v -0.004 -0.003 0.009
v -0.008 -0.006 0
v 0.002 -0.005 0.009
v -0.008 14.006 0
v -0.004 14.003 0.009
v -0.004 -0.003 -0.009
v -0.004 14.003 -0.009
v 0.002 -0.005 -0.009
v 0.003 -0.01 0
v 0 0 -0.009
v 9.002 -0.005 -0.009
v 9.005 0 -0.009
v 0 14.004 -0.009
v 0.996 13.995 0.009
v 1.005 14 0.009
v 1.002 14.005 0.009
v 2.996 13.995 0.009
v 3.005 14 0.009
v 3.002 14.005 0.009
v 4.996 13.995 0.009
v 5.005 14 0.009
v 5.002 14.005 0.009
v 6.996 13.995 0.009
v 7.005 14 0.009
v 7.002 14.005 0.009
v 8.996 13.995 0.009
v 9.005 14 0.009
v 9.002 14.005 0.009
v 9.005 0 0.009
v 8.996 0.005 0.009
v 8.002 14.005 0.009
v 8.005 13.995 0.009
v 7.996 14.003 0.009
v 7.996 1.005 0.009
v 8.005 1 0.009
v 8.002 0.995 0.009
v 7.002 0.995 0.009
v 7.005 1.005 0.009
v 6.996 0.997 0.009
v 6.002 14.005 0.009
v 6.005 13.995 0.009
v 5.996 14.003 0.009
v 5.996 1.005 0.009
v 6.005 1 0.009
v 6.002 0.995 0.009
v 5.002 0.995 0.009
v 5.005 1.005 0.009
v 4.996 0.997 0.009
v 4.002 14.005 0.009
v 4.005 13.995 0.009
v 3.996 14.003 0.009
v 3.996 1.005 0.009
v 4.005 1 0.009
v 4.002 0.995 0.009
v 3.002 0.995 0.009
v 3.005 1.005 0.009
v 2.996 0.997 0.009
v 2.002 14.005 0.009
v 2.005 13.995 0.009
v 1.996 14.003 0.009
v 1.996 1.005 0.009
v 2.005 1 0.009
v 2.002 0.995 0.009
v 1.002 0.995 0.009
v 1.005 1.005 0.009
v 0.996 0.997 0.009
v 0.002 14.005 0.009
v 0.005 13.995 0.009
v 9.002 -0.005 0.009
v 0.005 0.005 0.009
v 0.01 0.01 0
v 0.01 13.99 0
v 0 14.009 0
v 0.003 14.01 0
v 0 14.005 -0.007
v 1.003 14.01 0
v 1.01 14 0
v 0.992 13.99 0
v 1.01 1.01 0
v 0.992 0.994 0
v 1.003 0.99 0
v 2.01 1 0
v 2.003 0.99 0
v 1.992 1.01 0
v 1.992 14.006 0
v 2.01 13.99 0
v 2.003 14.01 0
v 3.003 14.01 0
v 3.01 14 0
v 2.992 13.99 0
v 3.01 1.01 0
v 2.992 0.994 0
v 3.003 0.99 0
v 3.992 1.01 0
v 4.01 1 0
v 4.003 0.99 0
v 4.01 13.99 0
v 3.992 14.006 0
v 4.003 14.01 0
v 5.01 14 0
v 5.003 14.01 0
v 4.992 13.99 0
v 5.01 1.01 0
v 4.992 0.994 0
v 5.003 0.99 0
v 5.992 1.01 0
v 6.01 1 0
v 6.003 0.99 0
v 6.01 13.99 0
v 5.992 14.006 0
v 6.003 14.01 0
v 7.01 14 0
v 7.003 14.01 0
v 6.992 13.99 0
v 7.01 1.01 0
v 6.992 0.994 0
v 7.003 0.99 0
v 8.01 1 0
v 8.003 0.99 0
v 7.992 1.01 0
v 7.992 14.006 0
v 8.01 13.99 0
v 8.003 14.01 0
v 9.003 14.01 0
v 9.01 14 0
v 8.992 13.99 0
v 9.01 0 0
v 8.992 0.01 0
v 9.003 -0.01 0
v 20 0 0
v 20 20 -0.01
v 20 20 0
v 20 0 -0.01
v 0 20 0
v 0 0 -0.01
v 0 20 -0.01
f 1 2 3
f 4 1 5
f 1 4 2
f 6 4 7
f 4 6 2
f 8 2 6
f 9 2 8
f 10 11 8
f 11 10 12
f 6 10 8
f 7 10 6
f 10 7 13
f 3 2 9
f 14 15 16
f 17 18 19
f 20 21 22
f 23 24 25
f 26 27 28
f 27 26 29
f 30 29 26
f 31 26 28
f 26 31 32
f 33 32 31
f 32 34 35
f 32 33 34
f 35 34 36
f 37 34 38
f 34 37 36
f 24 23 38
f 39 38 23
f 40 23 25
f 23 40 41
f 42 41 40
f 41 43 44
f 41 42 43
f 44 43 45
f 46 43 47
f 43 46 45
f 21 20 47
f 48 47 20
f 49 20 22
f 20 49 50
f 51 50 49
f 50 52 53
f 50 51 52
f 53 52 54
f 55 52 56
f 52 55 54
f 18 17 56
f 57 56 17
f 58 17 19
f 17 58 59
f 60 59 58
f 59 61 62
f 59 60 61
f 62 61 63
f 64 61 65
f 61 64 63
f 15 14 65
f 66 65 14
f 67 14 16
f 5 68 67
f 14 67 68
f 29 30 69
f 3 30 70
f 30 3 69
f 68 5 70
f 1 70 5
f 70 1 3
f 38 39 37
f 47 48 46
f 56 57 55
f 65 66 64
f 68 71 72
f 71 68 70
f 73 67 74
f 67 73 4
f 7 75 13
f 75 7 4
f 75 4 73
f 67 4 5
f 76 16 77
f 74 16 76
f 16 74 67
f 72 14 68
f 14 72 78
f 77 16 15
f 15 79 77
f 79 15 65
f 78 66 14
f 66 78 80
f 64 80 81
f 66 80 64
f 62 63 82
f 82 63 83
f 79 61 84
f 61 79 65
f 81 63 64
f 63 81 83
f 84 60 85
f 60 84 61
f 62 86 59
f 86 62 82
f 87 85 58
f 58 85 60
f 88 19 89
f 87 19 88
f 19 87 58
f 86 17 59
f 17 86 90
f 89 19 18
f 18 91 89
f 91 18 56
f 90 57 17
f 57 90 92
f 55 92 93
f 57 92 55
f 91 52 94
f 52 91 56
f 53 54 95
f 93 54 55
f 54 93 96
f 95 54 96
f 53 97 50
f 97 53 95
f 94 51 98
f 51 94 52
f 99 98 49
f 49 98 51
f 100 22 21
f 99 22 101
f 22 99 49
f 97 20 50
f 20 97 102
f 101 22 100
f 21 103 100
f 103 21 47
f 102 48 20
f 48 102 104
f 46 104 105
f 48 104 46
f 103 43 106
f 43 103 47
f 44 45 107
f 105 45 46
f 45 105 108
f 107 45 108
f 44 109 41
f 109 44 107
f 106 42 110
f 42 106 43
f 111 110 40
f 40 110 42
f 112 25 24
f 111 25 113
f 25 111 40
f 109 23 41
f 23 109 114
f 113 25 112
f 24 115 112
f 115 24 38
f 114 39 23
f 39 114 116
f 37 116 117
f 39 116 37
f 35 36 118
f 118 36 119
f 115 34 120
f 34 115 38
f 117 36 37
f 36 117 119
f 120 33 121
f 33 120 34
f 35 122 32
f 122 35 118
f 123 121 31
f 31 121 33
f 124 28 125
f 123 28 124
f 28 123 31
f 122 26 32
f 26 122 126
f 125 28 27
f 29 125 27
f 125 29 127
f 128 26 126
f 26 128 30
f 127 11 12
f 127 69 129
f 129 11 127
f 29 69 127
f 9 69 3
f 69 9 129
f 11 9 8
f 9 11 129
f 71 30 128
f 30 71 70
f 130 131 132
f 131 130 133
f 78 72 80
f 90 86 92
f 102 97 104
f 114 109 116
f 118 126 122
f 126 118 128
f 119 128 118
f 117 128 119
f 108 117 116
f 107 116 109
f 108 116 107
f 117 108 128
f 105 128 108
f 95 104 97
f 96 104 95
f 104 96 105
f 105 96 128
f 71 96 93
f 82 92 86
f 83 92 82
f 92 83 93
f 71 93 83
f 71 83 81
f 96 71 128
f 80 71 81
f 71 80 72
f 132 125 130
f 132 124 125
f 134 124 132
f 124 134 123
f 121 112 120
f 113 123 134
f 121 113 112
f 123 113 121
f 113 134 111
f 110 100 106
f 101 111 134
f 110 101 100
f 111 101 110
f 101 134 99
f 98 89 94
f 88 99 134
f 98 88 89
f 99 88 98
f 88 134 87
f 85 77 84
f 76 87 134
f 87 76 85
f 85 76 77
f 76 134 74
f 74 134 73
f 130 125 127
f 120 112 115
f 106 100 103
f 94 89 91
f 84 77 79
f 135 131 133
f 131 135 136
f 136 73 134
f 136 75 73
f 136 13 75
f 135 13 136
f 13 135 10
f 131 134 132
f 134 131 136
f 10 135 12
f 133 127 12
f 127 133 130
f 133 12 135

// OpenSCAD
hull(){
    translate([0.0, 0.0]) sphere(0.01);
    translate([0.0, 1.0]) sphere(0.01);
}
hull(){
    translate([0.0, 1.0]) sphere(0.01);
    translate([0.0, 2.0]) sphere(0.01);
}
hull(){
    translate([0.0, 2.0]) sphere(0.01);
    translate([0.0, 3.0]) sphere(0.01);
}
hull(){
    translate([0.0, 3.0]) sphere(0.01);
    translate([0.0, 4.0]) sphere(0.01);
}
hull(){
    translate([0.0, 4.0]) sphere(0.01);
    translate([0.0, 5.0]) sphere(0.01);
}
hull(){
    translate([0.0, 5.0]) sphere(0.01);
    translate([0.0, 6.0]) sphere(0.01);
}
hull(){
    translate([0.0, 6.0]) sphere(0.01);
    translate([0.0, 7.0]) sphere(0.01);
}
hull(){
    translate([0.0, 7.0]) sphere(0.01);
    translate([0.0, 8.0]) sphere(0.01);
}
hull(){
    translate([0.0, 8.0]) sphere(0.01);
    translate([0.0, 9.0]) sphere(0.01);
}
hull(){
    translate([0.0, 9.0]) sphere(0.01);
    translate([0.0, 10.0]) sphere(0.01);
}
hull(){
    translate([0.0, 10.0]) sphere(0.01);
    translate([0.0, 11.0]) sphere(0.01);
}
hull(){
    translate([0.0, 11.0]) sphere(0.01);
    translate([0.0, 12.0]) sphere(0.01);
}
hull(){
    translate([0.0, 12.0]) sphere(0.01);
    translate([0.0, 13.0]) sphere(0.01);
}
hull(){
    translate([0.0, 13.0]) sphere(0.01);
    translate([0.0, 14.0]) sphere(0.01);
}
hull(){
    translate([0.0, 14.0]) sphere(0.01);
    translate([1.0, 14.0]) sphere(0.01);
}
hull(){
    translate([1.0, 14.0]) sphere(0.01);
    translate([1.0, 13.0]) sphere(0.01);
}
hull(){
    translate([1.0, 13.0]) sphere(0.01);
    translate([1.0, 12.0]) sphere(0.01);
}
hull(){
    translate([1.0, 12.0]) sphere(0.01);
    translate([1.0, 11.0]) sphere(0.01);
}
hull(){
    translate([1.0, 11.0]) sphere(0.01);
    translate([1.0, 10.0]) sphere(0.01);
}
hull(){
    translate([1.0, 10.0]) sphere(0.01);
    translate([1.0, 9.0]) sphere(0.01);
}
hull(){
    translate([1.0, 9.0]) sphere(0.01);
    translate([1.0, 8.0]) sphere(0.01);
}
hull(){
    translate([1.0, 8.0]) sphere(0.01);
    translate([1.0, 7.0]) sphere(0.01);
}
hull(){
    translate([1.0, 7.0]) sphere(0.01);
    translate([1.0, 6.0]) sphere(0.01);
}
hull(){
    translate([1.0, 6.0]) sphere(0.01);
    translate([1.0, 5.0]) sphere(0.01);
}
hull(){
    translate([1.0, 5.0]) sphere(0.01);
    translate([1.0, 4.0]) sphere(0.01);
}
hull(){
    translate([1.0, 4.0]) sphere(0.01);
    translate([1.0, 3.0]) sphere(0.01);
}
hull(){
    translate([1.0, 3.0]) sphere(0.01);
    translate([1.0, 2.0]) sphere(0.01);
}
hull(){
    translate([1.0, 2.0]) sphere(0.01);
    translate([1.0, 1.0]) sphere(0.01);
}
hull(){
    translate([1.0, 1.0]) sphere(0.01);
    translate([2.0, 1.0]) sphere(0.01);
}
hull(){
    translate([2.0, 1.0]) sphere(0.01);
    translate([2.0, 2.0]) sphere(0.01);
}
hull(){
    translate([2.0, 2.0]) sphere(0.01);
    translate([2.0, 3.0]) sphere(0.01);
}
hull(){
    translate([2.0, 3.0]) sphere(0.01);
    translate([2.0, 4.0]) sphere(0.01);
}
hull(){
    translate([2.0, 4.0]) sphere(0.01);
    translate([2.0, 5.0]) sphere(0.01);
}
hull(){
    translate([2.0, 5.0]) sphere(0.01);
    translate([2.0, 6.0]) sphere(0.01);
}
hull(){
    translate([2.0, 6.0]) sphere(0.01);
    translate([2.0, 7.0]) sphere(0.01);
}
hull(){
    translate([2.0, 7.0]) sphere(0.01);
    translate([2.0, 8.0]) sphere(0.01);
}
hull(){
    translate([2.0, 8.0]) sphere(0.01);
    translate([2.0, 9.0]) sphere(0.01);
}
hull(){
    translate([2.0, 9.0]) sphere(0.01);
    translate([2.0, 10.0]) sphere(0.01);
}
hull(){
    translate([2.0, 10.0]) sphere(0.01);
    translate([2.0, 11.0]) sphere(0.01);
}
hull(){
    translate([2.0, 11.0]) sphere(0.01);
    translate([2.0, 12.0]) sphere(0.01);
}
hull(){
    translate([2.0, 12.0]) sphere(0.01);
    translate([2.0, 13.0]) sphere(0.01);
}
hull(){
    translate([2.0, 13.0]) sphere(0.01);
    translate([2.0, 14.0]) sphere(0.01);
}
hull(){
    translate([2.0, 14.0]) sphere(0.01);
    translate([3.0, 14.0]) sphere(0.01);
}
hull(){
    translate([3.0, 14.0]) sphere(0.01);
    translate([3.0, 13.0]) sphere(0.01);
}
hull(){
    translate([3.0, 13.0]) sphere(0.01);
    translate([3.0, 12.0]) sphere(0.01);
}
hull(){
    translate([3.0, 12.0]) sphere(0.01);
    translate([3.0, 11.0]) sphere(0.01);
}
hull(){
    translate([3.0, 11.0]) sphere(0.01);
    translate([3.0, 10.0]) sphere(0.01);
}
hull(){
    translate([3.0, 10.0]) sphere(0.01);
    translate([3.0, 9.0]) sphere(0.01);
}
hull(){
    translate([3.0, 9.0]) sphere(0.01);
    translate([3.0, 8.0]) sphere(0.01);
}
hull(){
    translate([3.0, 8.0]) sphere(0.01);
    translate([3.0, 7.0]) sphere(0.01);
}
hull(){
    translate([3.0, 7.0]) sphere(0.01);
    translate([3.0, 6.0]) sphere(0.01);
}
hull(){
    translate([3.0, 6.0]) sphere(0.01);
    translate([3.0, 5.0]) sphere(0.01);
}
hull(){
    translate([3.0, 5.0]) sphere(0.01);
    translate([3.0, 4.0]) sphere(0.01);
}
hull(){
    translate([3.0, 4.0]) sphere(0.01);
    translate([3.0, 3.0]) sphere(0.01);
}
hull(){
    translate([3.0, 3.0]) sphere(0.01);
    translate([3.0, 2.0]) sphere(0.01);
}
hull(){
    translate([3.0, 2.0]) sphere(0.01);
    translate([3.0, 1.0]) sphere(0.01);
}
hull(){
    translate([3.0, 1.0]) sphere(0.01);
    translate([4.0, 1.0]) sphere(0.01);
}
hull(){
    translate([4.0, 1.0]) sphere(0.01);
    translate([4.0, 2.0]) sphere(0.01);
}
hull(){
    translate([4.0, 2.0]) sphere(0.01);
    translate([4.0, 3.0]) sphere(0.01);
}
hull(){
    translate([4.0, 3.0]) sphere(0.01);
    translate([4.0, 4.0]) sphere(0.01);
}
hull(){
    translate([4.0, 4.0]) sphere(0.01);
    translate([4.0, 5.0]) sphere(0.01);
}
hull(){
    translate([4.0, 5.0]) sphere(0.01);
    translate([4.0, 6.0]) sphere(0.01);
}
hull(){
    translate([4.0, 6.0]) sphere(0.01);
    translate([4.0, 7.0]) sphere(0.01);
}
hull(){
    translate([4.0, 7.0]) sphere(0.01);
    translate([4.0, 8.0]) sphere(0.01);
}
hull(){
    translate([4.0, 8.0]) sphere(0.01);
    translate([4.0, 9.0]) sphere(0.01);
}
hull(){
    translate([4.0, 9.0]) sphere(0.01);
    translate([4.0, 10.0]) sphere(0.01);
}
hull(){
    translate([4.0, 10.0]) sphere(0.01);
    translate([4.0, 11.0]) sphere(0.01);
}
hull(){
    translate([4.0, 11.0]) sphere(0.01);
    translate([4.0, 12.0]) sphere(0.01);
}
hull(){
    translate([4.0, 12.0]) sphere(0.01);
    translate([4.0, 13.0]) sphere(0.01);
}
hull(){
    translate([4.0, 13.0]) sphere(0.01);
    translate([4.0, 14.0]) sphere(0.01);
}
hull(){
    translate([4.0, 14.0]) sphere(0.01);
    translate([5.0, 14.0]) sphere(0.01);
}
hull(){
    translate([5.0, 14.0]) sphere(0.01);
    translate([5.0, 13.0]) sphere(0.01);
}
hull(){
    translate([5.0, 13.0]) sphere(0.01);
    translate([5.0, 12.0]) sphere(0.01);
}
hull(){
    translate([5.0, 12.0]) sphere(0.01);
    translate([5.0, 11.0]) sphere(0.01);
}
hull(){
    translate([5.0, 11.0]) sphere(0.01);
    translate([5.0, 10.0]) sphere(0.01);
}
hull(){
    translate([5.0, 10.0]) sphere(0.01);
    translate([5.0, 9.0]) sphere(0.01);
}
hull(){
    translate([5.0, 9.0]) sphere(0.01);
    translate([5.0, 8.0]) sphere(0.01);
}
hull(){
    translate([5.0, 8.0]) sphere(0.01);
    translate([5.0, 7.0]) sphere(0.01);
}
hull(){
    translate([5.0, 7.0]) sphere(0.01);
    translate([5.0, 6.0]) sphere(0.01);
}
hull(){
    translate([5.0, 6.0]) sphere(0.01);
    translate([5.0, 5.0]) sphere(0.01);
}
hull(){
    translate([5.0, 5.0]) sphere(0.01);
    translate([5.0, 4.0]) sphere(0.01);
}
hull(){
    translate([5.0, 4.0]) sphere(0.01);
    translate([5.0, 3.0]) sphere(0.01);
}
hull(){
    translate([5.0, 3.0]) sphere(0.01);
    translate([5.0, 2.0]) sphere(0.01);
}
hull(){
    translate([5.0, 2.0]) sphere(0.01);
    translate([5.0, 1.0]) sphere(0.01);
}
hull(){
    translate([5.0, 1.0]) sphere(0.01);
    translate([6.0, 1.0]) sphere(0.01);
}
hull(){
    translate([6.0, 1.0]) sphere(0.01);
    translate([6.0, 2.0]) sphere(0.01);
}
hull(){
    translate([6.0, 2.0]) sphere(0.01);
    translate([6.0, 3.0]) sphere(0.01);
}
hull(){
    translate([6.0, 3.0]) sphere(0.01);
    translate([6.0, 4.0]) sphere(0.01);
}
hull(){
    translate([6.0, 4.0]) sphere(0.01);
    translate([6.0, 5.0]) sphere(0.01);
}
hull(){
    translate([6.0, 5.0]) sphere(0.01);
    translate([6.0, 6.0]) sphere(0.01);
}
hull(){
    translate([6.0, 6.0]) sphere(0.01);
    translate([6.0, 7.0]) sphere(0.01);
}
hull(){
    translate([6.0, 7.0]) sphere(0.01);
    translate([6.0, 8.0]) sphere(0.01);
}
hull(){
    translate([6.0, 8.0]) sphere(0.01);
    translate([6.0, 9.0]) sphere(0.01);
}
hull(){
    translate([6.0, 9.0]) sphere(0.01);
    translate([6.0, 10.0]) sphere(0.01);
}
hull(){
    translate([6.0, 10.0]) sphere(0.01);
    translate([6.0, 11.0]) sphere(0.01);
}
hull(){
    translate([6.0, 11.0]) sphere(0.01);
    translate([6.0, 12.0]) sphere(0.01);
}
hull(){
    translate([6.0, 12.0]) sphere(0.01);
    translate([6.0, 13.0]) sphere(0.01);
}
hull(){
    translate([6.0, 13.0]) sphere(0.01);
    translate([6.0, 14.0]) sphere(0.01);
}
hull(){
    translate([6.0, 14.0]) sphere(0.01);
    translate([7.0, 14.0]) sphere(0.01);
}
hull(){
    translate([7.0, 14.0]) sphere(0.01);
    translate([7.0, 13.0]) sphere(0.01);
}
hull(){
    translate([7.0, 13.0]) sphere(0.01);
    translate([7.0, 12.0]) sphere(0.01);
}
hull(){
    translate([7.0, 12.0]) sphere(0.01);
    translate([7.0, 11.0]) sphere(0.01);
}
hull(){
    translate([7.0, 11.0]) sphere(0.01);
    translate([7.0, 10.0]) sphere(0.01);
}
hull(){
    translate([7.0, 10.0]) sphere(0.01);
    translate([7.0, 9.0]) sphere(0.01);
}
hull(){
    translate([7.0, 9.0]) sphere(0.01);
    translate([7.0, 8.0]) sphere(0.01);
}
hull(){
    translate([7.0, 8.0]) sphere(0.01);
    translate([7.0, 7.0]) sphere(0.01);
}
hull(){
    translate([7.0, 7.0]) sphere(0.01);
    translate([7.0, 6.0]) sphere(0.01);
}
hull(){
    translate([7.0, 6.0]) sphere(0.01);
    translate([7.0, 5.0]) sphere(0.01);
}
hull(){
    translate([7.0, 5.0]) sphere(0.01);
    translate([7.0, 4.0]) sphere(0.01);
}
hull(){
    translate([7.0, 4.0]) sphere(0.01);
    translate([7.0, 3.0]) sphere(0.01);
}
hull(){
    translate([7.0, 3.0]) sphere(0.01);
    translate([7.0, 2.0]) sphere(0.01);
}
hull(){
    translate([7.0, 2.0]) sphere(0.01);
    translate([7.0, 1.0]) sphere(0.01);
}
hull(){
    translate([7.0, 1.0]) sphere(0.01);
    translate([8.0, 1.0]) sphere(0.01);
}
hull(){
    translate([8.0, 1.0]) sphere(0.01);
    translate([8.0, 2.0]) sphere(0.01);
}
hull(){
    translate([8.0, 2.0]) sphere(0.01);
    translate([8.0, 3.0]) sphere(0.01);
}
hull(){
    translate([8.0, 3.0]) sphere(0.01);
    translate([8.0, 4.0]) sphere(0.01);
}
hull(){
    translate([8.0, 4.0]) sphere(0.01);
    translate([8.0, 5.0]) sphere(0.01);
}
hull(){
    translate([8.0, 5.0]) sphere(0.01);
    translate([8.0, 6.0]) sphere(0.01);
}
hull(){
    translate([8.0, 6.0]) sphere(0.01);
    translate([8.0, 7.0]) sphere(0.01);
}
hull(){
    translate([8.0, 7.0]) sphere(0.01);
    translate([8.0, 8.0]) sphere(0.01);
}
hull(){
    translate([8.0, 8.0]) sphere(0.01);
    translate([8.0, 9.0]) sphere(0.01);
}
hull(){
    translate([8.0, 9.0]) sphere(0.01);
    translate([8.0, 10.0]) sphere(0.01);
}
hull(){
    translate([8.0, 10.0]) sphere(0.01);
    translate([8.0, 11.0]) sphere(0.01);
}
hull(){
    translate([8.0, 11.0]) sphere(0.01);
    translate([8.0, 12.0]) sphere(0.01);
}
hull(){
    translate([8.0, 12.0]) sphere(0.01);
    translate([8.0, 13.0]) sphere(0.01);
}
hull(){
    translate([8.0, 13.0]) sphere(0.01);
    translate([8.0, 14.0]) sphere(0.01);
}
hull(){
    translate([8.0, 14.0]) sphere(0.01);
    translate([9.0, 14.0]) sphere(0.01);
}
hull(){
    translate([9.0, 14.0]) sphere(0.01);
    translate([9.0, 13.0]) sphere(0.01);
}
hull(){
    translate([9.0, 13.0]) sphere(0.01);
    translate([9.0, 12.0]) sphere(0.01);
}
hull(){
    translate([9.0, 12.0]) sphere(0.01);
    translate([9.0, 11.0]) sphere(0.01);
}
hull(){
    translate([9.0, 11.0]) sphere(0.01);
    translate([9.0, 10.0]) sphere(0.01);
}
hull(){
    translate([9.0, 10.0]) sphere(0.01);
    translate([9.0, 9.0]) sphere(0.01);
}
hull(){
    translate([9.0, 9.0]) sphere(0.01);
    translate([9.0, 8.0]) sphere(0.01);
}
hull(){
    translate([9.0, 8.0]) sphere(0.01);
    translate([9.0, 7.0]) sphere(0.01);
}
hull(){
    translate([9.0, 7.0]) sphere(0.01);
    translate([9.0, 6.0]) sphere(0.01);
}
hull(){
    translate([9.0, 6.0]) sphere(0.01);
    translate([9.0, 5.0]) sphere(0.01);
}
hull(){
    translate([9.0, 5.0]) sphere(0.01);
    translate([9.0, 4.0]) sphere(0.01);
}
hull(){
    translate([9.0, 4.0]) sphere(0.01);
    translate([9.0, 3.0]) sphere(0.01);
}
hull(){
    translate([9.0, 3.0]) sphere(0.01);
    translate([9.0, 2.0]) sphere(0.01);
}
hull(){
    translate([9.0, 2.0]) sphere(0.01);
    translate([9.0, 1.0]) sphere(0.01);
}
hull(){
    translate([9.0, 1.0]) sphere(0.01);
    translate([9.0, 0.0]) sphere(0.01);
}
hull(){
    translate([9.0, 0.0]) sphere(0.01);
    translate([8.0, 0.0]) sphere(0.01);
}
hull(){
    translate([8.0, 0.0]) sphere(0.01);
    translate([7.0, 0.0]) sphere(0.01);
}
hull(){
    translate([7.0, 0.0]) sphere(0.01);
    translate([6.0, 0.0]) sphere(0.01);
}
hull(){
    translate([6.0, 0.0]) sphere(0.01);
    translate([5.0, 0.0]) sphere(0.01);
}
hull(){
    translate([5.0, 0.0]) sphere(0.01);
    translate([4.0, 0.0]) sphere(0.01);
}
hull(){
    translate([4.0, 0.0]) sphere(0.01);
    translate([3.0, 0.0]) sphere(0.01);
}
hull(){
    translate([3.0, 0.0]) sphere(0.01);
    translate([2.0, 0.0]) sphere(0.01);
}
hull(){
    translate([2.0, 0.0]) sphere(0.01);
    translate([1.0, 0.0]) sphere(0.01);
}
hull(){
    translate([1.0, 0.0]) sphere(0.01);
    translate([0.0, 0.0]) sphere(0.01);
}
translate([0,0,-0.01]) color([0.1,0.1,0.1]) cube([20,20,0.01]);
